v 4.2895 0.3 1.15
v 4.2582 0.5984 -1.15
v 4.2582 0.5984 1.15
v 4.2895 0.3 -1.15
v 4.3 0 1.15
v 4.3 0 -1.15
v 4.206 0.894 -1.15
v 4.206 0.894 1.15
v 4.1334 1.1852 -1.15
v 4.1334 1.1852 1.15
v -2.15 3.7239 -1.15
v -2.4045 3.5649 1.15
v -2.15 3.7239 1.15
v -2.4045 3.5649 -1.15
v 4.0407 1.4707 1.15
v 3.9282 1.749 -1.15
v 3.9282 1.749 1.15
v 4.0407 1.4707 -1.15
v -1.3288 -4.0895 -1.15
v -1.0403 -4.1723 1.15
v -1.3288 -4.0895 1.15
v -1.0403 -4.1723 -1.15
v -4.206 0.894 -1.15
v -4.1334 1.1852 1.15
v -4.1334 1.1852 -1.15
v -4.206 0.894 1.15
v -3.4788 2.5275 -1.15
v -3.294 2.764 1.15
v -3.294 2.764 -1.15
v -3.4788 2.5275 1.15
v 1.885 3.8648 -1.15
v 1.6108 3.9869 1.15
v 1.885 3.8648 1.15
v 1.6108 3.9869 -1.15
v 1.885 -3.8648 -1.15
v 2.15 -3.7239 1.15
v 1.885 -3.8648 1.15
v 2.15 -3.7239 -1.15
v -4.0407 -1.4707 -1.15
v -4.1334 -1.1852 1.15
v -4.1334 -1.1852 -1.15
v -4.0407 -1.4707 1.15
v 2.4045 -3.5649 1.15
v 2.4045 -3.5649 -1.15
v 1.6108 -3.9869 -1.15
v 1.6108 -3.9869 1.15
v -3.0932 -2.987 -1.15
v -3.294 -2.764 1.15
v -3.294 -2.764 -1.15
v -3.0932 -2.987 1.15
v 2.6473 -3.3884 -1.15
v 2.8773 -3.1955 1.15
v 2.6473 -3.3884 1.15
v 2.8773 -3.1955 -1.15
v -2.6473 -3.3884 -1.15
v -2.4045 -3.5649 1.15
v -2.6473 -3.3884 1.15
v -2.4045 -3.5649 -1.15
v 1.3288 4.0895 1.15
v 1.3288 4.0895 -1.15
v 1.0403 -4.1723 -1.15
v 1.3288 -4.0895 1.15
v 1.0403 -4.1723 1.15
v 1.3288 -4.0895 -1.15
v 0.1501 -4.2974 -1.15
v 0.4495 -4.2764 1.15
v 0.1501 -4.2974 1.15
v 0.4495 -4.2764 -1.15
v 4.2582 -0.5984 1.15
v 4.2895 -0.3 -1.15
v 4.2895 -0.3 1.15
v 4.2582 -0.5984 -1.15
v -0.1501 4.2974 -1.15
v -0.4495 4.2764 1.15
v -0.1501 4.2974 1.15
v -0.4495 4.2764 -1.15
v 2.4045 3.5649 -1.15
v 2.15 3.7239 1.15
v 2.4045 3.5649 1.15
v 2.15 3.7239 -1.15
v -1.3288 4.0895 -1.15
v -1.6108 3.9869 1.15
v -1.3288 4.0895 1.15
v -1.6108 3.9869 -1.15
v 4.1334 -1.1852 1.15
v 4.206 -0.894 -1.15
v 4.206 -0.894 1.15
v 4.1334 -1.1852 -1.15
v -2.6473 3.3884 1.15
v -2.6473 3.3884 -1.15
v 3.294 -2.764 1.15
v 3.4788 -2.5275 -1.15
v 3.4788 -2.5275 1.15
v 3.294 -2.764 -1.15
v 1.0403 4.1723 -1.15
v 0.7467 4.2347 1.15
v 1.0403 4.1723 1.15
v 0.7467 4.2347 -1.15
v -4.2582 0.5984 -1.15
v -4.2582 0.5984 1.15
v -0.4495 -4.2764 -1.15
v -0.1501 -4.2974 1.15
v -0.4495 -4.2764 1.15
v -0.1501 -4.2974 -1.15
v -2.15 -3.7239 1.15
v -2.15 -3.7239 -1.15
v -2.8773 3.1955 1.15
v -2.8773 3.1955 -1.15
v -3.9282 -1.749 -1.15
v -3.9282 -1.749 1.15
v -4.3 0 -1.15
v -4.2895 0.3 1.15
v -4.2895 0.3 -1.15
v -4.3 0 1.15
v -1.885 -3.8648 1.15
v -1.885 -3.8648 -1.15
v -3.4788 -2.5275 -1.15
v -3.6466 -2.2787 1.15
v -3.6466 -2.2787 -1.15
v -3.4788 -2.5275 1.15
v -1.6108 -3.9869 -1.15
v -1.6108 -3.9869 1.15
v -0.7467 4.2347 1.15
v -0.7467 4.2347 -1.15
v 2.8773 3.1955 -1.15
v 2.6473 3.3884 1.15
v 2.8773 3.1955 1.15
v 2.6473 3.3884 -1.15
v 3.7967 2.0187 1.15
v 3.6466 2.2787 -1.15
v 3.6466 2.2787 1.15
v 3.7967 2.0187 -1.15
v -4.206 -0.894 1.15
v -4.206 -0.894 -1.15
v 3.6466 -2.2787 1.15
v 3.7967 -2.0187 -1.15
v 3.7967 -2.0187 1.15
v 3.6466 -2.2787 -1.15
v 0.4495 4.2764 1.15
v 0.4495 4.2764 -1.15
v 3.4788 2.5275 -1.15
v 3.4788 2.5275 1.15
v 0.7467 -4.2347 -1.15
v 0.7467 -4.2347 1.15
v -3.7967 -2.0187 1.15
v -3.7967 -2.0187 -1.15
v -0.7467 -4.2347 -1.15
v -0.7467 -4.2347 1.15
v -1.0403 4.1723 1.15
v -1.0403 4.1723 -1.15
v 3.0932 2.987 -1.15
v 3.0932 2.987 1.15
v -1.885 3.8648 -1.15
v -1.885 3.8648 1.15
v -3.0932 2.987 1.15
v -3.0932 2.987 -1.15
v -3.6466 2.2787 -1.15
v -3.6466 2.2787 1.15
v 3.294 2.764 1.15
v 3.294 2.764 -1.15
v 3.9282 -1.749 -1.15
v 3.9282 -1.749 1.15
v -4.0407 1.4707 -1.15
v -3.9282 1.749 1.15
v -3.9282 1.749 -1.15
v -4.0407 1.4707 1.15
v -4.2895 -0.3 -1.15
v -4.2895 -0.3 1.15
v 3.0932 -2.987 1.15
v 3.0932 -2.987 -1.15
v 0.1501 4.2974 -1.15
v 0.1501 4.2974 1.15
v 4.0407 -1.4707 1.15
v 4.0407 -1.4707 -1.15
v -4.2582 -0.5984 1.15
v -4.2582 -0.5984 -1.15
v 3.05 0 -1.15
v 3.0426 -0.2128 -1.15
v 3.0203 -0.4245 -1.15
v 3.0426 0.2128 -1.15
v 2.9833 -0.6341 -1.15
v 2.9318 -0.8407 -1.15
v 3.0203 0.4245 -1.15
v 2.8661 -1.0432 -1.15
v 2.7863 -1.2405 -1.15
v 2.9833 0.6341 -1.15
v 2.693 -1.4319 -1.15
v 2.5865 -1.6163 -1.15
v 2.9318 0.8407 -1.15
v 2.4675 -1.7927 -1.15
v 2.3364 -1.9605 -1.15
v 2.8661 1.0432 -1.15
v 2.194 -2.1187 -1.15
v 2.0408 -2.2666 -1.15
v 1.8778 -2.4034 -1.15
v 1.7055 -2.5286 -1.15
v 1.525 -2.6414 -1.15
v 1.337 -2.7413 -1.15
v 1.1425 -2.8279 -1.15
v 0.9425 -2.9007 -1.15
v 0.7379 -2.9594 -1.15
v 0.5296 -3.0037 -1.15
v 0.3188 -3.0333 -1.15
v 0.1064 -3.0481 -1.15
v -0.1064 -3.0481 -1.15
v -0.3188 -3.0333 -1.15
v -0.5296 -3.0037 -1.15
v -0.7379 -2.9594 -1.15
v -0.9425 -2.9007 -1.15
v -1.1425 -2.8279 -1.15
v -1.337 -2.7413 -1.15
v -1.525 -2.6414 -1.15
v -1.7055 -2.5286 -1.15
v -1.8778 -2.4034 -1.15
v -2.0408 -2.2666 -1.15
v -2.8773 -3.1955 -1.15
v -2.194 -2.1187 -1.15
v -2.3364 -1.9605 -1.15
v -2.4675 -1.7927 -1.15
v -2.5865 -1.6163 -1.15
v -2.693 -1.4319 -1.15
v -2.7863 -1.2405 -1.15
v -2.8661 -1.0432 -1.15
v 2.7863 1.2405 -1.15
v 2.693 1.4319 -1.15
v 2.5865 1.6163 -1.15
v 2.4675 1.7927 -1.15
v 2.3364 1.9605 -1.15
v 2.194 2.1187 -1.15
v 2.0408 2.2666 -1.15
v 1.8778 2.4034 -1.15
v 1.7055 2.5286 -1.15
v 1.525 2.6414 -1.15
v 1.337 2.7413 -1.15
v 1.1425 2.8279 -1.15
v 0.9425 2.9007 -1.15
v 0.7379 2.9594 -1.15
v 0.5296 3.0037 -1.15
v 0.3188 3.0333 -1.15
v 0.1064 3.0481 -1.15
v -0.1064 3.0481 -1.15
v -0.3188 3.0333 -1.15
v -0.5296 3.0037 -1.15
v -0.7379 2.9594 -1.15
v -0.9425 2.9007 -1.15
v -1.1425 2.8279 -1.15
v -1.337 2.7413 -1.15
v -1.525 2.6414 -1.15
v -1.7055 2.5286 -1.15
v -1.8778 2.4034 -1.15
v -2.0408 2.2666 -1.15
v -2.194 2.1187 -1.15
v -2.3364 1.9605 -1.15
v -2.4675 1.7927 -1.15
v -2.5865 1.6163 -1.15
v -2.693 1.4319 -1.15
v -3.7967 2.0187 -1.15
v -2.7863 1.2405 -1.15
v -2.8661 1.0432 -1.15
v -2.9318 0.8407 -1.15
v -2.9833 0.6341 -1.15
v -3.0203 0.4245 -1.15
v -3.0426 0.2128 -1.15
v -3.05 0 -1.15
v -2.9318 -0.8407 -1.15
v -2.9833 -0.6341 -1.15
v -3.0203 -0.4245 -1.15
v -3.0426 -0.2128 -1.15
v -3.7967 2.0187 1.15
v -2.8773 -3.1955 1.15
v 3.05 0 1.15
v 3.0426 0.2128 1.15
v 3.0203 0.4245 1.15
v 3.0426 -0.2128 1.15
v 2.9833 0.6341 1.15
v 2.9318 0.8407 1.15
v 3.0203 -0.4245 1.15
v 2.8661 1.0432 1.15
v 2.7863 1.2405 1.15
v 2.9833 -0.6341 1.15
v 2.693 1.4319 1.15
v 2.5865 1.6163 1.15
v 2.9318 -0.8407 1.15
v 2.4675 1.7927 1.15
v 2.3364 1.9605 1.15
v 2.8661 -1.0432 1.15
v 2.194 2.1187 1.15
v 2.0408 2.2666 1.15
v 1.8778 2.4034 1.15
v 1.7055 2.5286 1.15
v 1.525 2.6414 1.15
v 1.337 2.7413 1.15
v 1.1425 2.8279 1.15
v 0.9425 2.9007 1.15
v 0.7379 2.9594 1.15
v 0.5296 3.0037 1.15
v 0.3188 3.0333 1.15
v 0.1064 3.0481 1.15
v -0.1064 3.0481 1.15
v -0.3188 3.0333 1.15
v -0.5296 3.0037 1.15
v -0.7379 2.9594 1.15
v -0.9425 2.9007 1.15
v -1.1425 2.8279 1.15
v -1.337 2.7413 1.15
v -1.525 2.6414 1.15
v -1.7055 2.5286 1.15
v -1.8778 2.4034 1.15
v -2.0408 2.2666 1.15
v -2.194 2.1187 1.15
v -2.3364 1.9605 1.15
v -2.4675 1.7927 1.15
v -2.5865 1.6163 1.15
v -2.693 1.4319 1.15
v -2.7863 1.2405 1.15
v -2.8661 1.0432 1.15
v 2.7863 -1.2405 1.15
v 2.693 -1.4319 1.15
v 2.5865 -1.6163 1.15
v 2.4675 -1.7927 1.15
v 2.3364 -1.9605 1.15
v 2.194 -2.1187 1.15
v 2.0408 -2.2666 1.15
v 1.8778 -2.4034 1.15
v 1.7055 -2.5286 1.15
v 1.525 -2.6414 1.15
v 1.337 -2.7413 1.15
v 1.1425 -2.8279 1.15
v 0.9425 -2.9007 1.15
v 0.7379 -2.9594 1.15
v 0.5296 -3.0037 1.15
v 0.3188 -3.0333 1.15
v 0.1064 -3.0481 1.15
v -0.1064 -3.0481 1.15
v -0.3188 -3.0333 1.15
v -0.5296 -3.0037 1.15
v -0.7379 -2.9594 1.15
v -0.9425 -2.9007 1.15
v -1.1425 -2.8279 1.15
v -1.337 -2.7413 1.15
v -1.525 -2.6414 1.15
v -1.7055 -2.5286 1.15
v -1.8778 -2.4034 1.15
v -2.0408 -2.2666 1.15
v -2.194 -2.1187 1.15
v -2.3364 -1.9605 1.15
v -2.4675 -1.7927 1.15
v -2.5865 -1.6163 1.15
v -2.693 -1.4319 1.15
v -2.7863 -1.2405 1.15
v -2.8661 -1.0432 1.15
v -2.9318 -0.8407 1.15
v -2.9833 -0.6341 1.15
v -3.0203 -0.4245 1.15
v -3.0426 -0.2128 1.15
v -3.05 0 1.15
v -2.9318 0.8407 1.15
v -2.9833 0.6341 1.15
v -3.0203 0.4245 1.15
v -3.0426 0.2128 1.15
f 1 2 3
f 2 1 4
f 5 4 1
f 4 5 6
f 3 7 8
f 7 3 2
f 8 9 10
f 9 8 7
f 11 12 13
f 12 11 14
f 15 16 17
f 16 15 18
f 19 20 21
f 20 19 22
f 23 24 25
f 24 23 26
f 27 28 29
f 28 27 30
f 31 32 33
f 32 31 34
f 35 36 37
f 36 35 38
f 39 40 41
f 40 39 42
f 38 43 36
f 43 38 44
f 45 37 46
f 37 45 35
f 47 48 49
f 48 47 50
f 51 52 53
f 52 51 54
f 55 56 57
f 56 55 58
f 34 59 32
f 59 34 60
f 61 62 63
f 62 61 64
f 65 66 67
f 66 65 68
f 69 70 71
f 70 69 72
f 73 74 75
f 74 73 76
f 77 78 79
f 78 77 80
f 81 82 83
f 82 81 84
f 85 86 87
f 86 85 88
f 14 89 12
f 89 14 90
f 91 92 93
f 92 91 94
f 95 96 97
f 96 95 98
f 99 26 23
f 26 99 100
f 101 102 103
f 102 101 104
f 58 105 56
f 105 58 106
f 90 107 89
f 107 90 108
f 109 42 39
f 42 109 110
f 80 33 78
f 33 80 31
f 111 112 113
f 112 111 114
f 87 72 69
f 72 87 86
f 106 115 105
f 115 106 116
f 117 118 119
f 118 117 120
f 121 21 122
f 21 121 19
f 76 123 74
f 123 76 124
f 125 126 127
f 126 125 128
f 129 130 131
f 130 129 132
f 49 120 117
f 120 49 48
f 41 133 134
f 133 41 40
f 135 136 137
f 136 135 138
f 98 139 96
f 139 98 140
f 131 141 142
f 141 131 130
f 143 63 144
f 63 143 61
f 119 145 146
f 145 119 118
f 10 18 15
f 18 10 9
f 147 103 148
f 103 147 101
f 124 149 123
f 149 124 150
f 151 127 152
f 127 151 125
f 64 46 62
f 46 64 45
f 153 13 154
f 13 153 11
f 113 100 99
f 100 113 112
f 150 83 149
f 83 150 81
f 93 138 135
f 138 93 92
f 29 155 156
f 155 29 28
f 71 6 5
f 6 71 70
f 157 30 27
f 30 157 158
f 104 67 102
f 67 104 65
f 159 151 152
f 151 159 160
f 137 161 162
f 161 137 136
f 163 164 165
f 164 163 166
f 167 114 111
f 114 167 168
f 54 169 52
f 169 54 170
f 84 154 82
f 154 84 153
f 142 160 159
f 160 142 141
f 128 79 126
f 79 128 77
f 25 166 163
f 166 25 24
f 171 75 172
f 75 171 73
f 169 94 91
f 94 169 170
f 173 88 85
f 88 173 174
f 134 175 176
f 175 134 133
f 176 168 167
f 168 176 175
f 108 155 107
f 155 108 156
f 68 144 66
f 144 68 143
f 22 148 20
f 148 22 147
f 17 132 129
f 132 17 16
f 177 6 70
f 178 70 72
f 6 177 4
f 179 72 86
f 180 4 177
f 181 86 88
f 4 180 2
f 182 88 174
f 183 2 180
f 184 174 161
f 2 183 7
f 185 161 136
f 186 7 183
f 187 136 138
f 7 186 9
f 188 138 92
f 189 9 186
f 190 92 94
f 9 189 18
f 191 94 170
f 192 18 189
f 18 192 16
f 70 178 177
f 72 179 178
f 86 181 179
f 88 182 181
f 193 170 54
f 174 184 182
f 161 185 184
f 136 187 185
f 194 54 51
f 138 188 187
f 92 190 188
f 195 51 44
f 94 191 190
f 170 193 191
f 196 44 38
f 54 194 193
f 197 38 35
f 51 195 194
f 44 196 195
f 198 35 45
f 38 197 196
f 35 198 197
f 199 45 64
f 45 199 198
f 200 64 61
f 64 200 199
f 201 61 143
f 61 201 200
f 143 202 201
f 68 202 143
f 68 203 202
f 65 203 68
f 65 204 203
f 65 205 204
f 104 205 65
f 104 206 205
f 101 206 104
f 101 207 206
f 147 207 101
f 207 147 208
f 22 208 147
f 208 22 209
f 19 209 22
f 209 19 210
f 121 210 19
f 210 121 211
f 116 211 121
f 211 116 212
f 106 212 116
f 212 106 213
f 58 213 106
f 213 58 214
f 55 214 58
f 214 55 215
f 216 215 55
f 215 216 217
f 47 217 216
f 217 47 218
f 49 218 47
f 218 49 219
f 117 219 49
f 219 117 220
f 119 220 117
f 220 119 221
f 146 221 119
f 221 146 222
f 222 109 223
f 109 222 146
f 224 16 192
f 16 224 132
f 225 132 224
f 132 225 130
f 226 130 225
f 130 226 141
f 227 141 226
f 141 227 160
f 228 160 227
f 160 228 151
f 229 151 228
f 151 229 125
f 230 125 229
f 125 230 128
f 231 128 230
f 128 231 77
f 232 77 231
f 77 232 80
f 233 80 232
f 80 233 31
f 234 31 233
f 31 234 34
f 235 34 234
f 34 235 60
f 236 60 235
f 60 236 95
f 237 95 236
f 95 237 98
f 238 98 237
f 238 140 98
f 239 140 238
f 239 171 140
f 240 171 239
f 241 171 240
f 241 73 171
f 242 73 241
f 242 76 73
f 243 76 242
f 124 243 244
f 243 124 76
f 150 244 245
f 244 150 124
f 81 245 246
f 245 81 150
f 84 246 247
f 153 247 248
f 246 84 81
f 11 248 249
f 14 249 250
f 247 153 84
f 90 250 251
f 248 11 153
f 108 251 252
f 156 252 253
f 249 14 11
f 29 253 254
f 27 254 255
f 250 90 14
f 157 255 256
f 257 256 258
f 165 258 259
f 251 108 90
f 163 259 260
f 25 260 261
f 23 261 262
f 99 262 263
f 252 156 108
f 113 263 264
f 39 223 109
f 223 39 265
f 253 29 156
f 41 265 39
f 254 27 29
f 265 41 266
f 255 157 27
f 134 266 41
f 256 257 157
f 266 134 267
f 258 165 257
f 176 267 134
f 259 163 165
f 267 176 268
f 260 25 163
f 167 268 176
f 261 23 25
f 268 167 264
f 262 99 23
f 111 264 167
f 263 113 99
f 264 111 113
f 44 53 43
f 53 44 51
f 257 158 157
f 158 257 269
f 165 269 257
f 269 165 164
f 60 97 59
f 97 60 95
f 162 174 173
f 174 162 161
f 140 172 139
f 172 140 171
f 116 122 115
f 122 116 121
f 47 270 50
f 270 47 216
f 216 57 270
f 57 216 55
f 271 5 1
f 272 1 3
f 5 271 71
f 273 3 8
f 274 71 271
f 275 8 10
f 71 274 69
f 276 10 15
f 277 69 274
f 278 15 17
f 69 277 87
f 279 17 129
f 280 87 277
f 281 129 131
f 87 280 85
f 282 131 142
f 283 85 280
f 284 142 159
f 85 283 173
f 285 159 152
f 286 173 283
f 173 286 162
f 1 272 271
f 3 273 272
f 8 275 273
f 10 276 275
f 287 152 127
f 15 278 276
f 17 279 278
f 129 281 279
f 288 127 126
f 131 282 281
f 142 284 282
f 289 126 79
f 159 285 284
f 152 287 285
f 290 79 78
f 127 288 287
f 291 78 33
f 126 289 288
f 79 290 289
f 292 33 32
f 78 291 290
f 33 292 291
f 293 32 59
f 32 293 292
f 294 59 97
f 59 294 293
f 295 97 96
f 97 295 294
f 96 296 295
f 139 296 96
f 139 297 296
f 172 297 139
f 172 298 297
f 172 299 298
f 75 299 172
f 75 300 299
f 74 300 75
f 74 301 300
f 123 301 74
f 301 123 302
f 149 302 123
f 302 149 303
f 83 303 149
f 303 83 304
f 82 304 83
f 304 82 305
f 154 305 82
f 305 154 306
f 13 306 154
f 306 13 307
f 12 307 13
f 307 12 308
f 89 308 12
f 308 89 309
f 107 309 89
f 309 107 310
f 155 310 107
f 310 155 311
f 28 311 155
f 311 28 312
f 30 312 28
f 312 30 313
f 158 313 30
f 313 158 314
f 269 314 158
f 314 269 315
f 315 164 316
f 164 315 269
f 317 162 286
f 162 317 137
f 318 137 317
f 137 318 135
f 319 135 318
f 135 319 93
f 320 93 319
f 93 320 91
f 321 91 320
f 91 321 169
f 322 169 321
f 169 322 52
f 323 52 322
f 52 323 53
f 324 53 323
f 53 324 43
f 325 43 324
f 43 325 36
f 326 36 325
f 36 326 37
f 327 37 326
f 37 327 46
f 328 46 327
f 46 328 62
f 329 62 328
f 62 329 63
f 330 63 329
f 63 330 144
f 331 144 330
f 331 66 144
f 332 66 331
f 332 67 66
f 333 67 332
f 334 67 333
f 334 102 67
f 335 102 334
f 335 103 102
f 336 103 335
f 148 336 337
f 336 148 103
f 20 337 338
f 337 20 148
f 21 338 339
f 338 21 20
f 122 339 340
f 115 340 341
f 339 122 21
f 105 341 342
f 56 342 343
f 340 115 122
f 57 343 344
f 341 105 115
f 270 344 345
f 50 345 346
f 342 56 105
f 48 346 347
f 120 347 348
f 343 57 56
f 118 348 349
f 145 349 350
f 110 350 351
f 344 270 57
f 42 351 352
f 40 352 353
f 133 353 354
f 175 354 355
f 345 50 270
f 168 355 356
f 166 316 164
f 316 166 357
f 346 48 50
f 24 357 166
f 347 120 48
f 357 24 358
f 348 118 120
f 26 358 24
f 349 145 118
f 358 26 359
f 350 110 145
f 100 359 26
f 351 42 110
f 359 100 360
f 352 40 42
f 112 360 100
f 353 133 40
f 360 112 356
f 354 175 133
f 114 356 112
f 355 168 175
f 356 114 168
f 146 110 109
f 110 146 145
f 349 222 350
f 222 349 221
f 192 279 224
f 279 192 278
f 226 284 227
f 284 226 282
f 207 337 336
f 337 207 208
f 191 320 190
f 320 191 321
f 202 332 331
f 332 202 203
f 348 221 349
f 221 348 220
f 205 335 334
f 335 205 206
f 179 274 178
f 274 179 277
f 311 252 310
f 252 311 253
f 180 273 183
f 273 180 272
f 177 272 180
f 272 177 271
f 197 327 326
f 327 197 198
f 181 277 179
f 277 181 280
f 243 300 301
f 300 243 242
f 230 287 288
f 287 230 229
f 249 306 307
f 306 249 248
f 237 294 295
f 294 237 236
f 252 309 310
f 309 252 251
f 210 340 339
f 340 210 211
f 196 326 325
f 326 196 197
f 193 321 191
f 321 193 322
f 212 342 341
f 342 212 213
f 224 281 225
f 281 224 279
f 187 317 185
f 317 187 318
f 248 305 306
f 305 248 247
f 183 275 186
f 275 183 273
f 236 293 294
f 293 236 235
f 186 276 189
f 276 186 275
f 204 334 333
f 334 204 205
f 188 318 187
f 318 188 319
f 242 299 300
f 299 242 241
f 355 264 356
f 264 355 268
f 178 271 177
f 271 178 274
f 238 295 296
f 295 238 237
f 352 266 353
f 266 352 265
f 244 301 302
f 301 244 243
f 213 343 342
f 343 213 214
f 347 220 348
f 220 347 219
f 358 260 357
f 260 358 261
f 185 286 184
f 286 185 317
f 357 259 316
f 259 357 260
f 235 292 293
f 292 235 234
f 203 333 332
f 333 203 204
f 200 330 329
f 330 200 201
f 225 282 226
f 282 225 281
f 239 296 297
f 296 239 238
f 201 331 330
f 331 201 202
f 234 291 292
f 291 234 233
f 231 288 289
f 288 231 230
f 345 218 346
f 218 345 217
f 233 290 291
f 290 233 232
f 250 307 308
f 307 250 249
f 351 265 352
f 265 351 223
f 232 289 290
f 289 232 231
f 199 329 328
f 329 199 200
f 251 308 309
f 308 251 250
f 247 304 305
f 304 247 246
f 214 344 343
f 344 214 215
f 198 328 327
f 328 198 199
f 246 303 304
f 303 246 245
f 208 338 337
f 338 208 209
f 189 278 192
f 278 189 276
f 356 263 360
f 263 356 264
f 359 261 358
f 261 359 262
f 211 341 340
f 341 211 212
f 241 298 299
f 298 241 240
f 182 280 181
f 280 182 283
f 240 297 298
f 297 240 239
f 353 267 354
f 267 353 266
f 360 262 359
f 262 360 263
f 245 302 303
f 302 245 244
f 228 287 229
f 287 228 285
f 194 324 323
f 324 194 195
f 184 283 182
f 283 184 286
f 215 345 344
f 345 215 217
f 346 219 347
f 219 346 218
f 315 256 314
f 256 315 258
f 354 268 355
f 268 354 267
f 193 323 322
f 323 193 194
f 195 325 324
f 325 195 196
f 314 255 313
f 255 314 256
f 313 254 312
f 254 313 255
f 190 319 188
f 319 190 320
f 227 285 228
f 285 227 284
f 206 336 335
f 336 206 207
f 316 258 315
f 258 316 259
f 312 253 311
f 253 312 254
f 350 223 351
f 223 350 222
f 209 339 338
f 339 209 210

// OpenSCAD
height=2.3;
innerDia = 6.1;
outerDia = innerDia + 2.5;

triggerSpacer();

module triggerSpacer()
{
    difference()
    {
        cylinder(r=outerDia/2, h=height, center=true, $fn=($preview?30:90));
        cylinder(r=innerDia/2, h=height+0.02, center=true, $fn=($preview?30:90));
    }
}
